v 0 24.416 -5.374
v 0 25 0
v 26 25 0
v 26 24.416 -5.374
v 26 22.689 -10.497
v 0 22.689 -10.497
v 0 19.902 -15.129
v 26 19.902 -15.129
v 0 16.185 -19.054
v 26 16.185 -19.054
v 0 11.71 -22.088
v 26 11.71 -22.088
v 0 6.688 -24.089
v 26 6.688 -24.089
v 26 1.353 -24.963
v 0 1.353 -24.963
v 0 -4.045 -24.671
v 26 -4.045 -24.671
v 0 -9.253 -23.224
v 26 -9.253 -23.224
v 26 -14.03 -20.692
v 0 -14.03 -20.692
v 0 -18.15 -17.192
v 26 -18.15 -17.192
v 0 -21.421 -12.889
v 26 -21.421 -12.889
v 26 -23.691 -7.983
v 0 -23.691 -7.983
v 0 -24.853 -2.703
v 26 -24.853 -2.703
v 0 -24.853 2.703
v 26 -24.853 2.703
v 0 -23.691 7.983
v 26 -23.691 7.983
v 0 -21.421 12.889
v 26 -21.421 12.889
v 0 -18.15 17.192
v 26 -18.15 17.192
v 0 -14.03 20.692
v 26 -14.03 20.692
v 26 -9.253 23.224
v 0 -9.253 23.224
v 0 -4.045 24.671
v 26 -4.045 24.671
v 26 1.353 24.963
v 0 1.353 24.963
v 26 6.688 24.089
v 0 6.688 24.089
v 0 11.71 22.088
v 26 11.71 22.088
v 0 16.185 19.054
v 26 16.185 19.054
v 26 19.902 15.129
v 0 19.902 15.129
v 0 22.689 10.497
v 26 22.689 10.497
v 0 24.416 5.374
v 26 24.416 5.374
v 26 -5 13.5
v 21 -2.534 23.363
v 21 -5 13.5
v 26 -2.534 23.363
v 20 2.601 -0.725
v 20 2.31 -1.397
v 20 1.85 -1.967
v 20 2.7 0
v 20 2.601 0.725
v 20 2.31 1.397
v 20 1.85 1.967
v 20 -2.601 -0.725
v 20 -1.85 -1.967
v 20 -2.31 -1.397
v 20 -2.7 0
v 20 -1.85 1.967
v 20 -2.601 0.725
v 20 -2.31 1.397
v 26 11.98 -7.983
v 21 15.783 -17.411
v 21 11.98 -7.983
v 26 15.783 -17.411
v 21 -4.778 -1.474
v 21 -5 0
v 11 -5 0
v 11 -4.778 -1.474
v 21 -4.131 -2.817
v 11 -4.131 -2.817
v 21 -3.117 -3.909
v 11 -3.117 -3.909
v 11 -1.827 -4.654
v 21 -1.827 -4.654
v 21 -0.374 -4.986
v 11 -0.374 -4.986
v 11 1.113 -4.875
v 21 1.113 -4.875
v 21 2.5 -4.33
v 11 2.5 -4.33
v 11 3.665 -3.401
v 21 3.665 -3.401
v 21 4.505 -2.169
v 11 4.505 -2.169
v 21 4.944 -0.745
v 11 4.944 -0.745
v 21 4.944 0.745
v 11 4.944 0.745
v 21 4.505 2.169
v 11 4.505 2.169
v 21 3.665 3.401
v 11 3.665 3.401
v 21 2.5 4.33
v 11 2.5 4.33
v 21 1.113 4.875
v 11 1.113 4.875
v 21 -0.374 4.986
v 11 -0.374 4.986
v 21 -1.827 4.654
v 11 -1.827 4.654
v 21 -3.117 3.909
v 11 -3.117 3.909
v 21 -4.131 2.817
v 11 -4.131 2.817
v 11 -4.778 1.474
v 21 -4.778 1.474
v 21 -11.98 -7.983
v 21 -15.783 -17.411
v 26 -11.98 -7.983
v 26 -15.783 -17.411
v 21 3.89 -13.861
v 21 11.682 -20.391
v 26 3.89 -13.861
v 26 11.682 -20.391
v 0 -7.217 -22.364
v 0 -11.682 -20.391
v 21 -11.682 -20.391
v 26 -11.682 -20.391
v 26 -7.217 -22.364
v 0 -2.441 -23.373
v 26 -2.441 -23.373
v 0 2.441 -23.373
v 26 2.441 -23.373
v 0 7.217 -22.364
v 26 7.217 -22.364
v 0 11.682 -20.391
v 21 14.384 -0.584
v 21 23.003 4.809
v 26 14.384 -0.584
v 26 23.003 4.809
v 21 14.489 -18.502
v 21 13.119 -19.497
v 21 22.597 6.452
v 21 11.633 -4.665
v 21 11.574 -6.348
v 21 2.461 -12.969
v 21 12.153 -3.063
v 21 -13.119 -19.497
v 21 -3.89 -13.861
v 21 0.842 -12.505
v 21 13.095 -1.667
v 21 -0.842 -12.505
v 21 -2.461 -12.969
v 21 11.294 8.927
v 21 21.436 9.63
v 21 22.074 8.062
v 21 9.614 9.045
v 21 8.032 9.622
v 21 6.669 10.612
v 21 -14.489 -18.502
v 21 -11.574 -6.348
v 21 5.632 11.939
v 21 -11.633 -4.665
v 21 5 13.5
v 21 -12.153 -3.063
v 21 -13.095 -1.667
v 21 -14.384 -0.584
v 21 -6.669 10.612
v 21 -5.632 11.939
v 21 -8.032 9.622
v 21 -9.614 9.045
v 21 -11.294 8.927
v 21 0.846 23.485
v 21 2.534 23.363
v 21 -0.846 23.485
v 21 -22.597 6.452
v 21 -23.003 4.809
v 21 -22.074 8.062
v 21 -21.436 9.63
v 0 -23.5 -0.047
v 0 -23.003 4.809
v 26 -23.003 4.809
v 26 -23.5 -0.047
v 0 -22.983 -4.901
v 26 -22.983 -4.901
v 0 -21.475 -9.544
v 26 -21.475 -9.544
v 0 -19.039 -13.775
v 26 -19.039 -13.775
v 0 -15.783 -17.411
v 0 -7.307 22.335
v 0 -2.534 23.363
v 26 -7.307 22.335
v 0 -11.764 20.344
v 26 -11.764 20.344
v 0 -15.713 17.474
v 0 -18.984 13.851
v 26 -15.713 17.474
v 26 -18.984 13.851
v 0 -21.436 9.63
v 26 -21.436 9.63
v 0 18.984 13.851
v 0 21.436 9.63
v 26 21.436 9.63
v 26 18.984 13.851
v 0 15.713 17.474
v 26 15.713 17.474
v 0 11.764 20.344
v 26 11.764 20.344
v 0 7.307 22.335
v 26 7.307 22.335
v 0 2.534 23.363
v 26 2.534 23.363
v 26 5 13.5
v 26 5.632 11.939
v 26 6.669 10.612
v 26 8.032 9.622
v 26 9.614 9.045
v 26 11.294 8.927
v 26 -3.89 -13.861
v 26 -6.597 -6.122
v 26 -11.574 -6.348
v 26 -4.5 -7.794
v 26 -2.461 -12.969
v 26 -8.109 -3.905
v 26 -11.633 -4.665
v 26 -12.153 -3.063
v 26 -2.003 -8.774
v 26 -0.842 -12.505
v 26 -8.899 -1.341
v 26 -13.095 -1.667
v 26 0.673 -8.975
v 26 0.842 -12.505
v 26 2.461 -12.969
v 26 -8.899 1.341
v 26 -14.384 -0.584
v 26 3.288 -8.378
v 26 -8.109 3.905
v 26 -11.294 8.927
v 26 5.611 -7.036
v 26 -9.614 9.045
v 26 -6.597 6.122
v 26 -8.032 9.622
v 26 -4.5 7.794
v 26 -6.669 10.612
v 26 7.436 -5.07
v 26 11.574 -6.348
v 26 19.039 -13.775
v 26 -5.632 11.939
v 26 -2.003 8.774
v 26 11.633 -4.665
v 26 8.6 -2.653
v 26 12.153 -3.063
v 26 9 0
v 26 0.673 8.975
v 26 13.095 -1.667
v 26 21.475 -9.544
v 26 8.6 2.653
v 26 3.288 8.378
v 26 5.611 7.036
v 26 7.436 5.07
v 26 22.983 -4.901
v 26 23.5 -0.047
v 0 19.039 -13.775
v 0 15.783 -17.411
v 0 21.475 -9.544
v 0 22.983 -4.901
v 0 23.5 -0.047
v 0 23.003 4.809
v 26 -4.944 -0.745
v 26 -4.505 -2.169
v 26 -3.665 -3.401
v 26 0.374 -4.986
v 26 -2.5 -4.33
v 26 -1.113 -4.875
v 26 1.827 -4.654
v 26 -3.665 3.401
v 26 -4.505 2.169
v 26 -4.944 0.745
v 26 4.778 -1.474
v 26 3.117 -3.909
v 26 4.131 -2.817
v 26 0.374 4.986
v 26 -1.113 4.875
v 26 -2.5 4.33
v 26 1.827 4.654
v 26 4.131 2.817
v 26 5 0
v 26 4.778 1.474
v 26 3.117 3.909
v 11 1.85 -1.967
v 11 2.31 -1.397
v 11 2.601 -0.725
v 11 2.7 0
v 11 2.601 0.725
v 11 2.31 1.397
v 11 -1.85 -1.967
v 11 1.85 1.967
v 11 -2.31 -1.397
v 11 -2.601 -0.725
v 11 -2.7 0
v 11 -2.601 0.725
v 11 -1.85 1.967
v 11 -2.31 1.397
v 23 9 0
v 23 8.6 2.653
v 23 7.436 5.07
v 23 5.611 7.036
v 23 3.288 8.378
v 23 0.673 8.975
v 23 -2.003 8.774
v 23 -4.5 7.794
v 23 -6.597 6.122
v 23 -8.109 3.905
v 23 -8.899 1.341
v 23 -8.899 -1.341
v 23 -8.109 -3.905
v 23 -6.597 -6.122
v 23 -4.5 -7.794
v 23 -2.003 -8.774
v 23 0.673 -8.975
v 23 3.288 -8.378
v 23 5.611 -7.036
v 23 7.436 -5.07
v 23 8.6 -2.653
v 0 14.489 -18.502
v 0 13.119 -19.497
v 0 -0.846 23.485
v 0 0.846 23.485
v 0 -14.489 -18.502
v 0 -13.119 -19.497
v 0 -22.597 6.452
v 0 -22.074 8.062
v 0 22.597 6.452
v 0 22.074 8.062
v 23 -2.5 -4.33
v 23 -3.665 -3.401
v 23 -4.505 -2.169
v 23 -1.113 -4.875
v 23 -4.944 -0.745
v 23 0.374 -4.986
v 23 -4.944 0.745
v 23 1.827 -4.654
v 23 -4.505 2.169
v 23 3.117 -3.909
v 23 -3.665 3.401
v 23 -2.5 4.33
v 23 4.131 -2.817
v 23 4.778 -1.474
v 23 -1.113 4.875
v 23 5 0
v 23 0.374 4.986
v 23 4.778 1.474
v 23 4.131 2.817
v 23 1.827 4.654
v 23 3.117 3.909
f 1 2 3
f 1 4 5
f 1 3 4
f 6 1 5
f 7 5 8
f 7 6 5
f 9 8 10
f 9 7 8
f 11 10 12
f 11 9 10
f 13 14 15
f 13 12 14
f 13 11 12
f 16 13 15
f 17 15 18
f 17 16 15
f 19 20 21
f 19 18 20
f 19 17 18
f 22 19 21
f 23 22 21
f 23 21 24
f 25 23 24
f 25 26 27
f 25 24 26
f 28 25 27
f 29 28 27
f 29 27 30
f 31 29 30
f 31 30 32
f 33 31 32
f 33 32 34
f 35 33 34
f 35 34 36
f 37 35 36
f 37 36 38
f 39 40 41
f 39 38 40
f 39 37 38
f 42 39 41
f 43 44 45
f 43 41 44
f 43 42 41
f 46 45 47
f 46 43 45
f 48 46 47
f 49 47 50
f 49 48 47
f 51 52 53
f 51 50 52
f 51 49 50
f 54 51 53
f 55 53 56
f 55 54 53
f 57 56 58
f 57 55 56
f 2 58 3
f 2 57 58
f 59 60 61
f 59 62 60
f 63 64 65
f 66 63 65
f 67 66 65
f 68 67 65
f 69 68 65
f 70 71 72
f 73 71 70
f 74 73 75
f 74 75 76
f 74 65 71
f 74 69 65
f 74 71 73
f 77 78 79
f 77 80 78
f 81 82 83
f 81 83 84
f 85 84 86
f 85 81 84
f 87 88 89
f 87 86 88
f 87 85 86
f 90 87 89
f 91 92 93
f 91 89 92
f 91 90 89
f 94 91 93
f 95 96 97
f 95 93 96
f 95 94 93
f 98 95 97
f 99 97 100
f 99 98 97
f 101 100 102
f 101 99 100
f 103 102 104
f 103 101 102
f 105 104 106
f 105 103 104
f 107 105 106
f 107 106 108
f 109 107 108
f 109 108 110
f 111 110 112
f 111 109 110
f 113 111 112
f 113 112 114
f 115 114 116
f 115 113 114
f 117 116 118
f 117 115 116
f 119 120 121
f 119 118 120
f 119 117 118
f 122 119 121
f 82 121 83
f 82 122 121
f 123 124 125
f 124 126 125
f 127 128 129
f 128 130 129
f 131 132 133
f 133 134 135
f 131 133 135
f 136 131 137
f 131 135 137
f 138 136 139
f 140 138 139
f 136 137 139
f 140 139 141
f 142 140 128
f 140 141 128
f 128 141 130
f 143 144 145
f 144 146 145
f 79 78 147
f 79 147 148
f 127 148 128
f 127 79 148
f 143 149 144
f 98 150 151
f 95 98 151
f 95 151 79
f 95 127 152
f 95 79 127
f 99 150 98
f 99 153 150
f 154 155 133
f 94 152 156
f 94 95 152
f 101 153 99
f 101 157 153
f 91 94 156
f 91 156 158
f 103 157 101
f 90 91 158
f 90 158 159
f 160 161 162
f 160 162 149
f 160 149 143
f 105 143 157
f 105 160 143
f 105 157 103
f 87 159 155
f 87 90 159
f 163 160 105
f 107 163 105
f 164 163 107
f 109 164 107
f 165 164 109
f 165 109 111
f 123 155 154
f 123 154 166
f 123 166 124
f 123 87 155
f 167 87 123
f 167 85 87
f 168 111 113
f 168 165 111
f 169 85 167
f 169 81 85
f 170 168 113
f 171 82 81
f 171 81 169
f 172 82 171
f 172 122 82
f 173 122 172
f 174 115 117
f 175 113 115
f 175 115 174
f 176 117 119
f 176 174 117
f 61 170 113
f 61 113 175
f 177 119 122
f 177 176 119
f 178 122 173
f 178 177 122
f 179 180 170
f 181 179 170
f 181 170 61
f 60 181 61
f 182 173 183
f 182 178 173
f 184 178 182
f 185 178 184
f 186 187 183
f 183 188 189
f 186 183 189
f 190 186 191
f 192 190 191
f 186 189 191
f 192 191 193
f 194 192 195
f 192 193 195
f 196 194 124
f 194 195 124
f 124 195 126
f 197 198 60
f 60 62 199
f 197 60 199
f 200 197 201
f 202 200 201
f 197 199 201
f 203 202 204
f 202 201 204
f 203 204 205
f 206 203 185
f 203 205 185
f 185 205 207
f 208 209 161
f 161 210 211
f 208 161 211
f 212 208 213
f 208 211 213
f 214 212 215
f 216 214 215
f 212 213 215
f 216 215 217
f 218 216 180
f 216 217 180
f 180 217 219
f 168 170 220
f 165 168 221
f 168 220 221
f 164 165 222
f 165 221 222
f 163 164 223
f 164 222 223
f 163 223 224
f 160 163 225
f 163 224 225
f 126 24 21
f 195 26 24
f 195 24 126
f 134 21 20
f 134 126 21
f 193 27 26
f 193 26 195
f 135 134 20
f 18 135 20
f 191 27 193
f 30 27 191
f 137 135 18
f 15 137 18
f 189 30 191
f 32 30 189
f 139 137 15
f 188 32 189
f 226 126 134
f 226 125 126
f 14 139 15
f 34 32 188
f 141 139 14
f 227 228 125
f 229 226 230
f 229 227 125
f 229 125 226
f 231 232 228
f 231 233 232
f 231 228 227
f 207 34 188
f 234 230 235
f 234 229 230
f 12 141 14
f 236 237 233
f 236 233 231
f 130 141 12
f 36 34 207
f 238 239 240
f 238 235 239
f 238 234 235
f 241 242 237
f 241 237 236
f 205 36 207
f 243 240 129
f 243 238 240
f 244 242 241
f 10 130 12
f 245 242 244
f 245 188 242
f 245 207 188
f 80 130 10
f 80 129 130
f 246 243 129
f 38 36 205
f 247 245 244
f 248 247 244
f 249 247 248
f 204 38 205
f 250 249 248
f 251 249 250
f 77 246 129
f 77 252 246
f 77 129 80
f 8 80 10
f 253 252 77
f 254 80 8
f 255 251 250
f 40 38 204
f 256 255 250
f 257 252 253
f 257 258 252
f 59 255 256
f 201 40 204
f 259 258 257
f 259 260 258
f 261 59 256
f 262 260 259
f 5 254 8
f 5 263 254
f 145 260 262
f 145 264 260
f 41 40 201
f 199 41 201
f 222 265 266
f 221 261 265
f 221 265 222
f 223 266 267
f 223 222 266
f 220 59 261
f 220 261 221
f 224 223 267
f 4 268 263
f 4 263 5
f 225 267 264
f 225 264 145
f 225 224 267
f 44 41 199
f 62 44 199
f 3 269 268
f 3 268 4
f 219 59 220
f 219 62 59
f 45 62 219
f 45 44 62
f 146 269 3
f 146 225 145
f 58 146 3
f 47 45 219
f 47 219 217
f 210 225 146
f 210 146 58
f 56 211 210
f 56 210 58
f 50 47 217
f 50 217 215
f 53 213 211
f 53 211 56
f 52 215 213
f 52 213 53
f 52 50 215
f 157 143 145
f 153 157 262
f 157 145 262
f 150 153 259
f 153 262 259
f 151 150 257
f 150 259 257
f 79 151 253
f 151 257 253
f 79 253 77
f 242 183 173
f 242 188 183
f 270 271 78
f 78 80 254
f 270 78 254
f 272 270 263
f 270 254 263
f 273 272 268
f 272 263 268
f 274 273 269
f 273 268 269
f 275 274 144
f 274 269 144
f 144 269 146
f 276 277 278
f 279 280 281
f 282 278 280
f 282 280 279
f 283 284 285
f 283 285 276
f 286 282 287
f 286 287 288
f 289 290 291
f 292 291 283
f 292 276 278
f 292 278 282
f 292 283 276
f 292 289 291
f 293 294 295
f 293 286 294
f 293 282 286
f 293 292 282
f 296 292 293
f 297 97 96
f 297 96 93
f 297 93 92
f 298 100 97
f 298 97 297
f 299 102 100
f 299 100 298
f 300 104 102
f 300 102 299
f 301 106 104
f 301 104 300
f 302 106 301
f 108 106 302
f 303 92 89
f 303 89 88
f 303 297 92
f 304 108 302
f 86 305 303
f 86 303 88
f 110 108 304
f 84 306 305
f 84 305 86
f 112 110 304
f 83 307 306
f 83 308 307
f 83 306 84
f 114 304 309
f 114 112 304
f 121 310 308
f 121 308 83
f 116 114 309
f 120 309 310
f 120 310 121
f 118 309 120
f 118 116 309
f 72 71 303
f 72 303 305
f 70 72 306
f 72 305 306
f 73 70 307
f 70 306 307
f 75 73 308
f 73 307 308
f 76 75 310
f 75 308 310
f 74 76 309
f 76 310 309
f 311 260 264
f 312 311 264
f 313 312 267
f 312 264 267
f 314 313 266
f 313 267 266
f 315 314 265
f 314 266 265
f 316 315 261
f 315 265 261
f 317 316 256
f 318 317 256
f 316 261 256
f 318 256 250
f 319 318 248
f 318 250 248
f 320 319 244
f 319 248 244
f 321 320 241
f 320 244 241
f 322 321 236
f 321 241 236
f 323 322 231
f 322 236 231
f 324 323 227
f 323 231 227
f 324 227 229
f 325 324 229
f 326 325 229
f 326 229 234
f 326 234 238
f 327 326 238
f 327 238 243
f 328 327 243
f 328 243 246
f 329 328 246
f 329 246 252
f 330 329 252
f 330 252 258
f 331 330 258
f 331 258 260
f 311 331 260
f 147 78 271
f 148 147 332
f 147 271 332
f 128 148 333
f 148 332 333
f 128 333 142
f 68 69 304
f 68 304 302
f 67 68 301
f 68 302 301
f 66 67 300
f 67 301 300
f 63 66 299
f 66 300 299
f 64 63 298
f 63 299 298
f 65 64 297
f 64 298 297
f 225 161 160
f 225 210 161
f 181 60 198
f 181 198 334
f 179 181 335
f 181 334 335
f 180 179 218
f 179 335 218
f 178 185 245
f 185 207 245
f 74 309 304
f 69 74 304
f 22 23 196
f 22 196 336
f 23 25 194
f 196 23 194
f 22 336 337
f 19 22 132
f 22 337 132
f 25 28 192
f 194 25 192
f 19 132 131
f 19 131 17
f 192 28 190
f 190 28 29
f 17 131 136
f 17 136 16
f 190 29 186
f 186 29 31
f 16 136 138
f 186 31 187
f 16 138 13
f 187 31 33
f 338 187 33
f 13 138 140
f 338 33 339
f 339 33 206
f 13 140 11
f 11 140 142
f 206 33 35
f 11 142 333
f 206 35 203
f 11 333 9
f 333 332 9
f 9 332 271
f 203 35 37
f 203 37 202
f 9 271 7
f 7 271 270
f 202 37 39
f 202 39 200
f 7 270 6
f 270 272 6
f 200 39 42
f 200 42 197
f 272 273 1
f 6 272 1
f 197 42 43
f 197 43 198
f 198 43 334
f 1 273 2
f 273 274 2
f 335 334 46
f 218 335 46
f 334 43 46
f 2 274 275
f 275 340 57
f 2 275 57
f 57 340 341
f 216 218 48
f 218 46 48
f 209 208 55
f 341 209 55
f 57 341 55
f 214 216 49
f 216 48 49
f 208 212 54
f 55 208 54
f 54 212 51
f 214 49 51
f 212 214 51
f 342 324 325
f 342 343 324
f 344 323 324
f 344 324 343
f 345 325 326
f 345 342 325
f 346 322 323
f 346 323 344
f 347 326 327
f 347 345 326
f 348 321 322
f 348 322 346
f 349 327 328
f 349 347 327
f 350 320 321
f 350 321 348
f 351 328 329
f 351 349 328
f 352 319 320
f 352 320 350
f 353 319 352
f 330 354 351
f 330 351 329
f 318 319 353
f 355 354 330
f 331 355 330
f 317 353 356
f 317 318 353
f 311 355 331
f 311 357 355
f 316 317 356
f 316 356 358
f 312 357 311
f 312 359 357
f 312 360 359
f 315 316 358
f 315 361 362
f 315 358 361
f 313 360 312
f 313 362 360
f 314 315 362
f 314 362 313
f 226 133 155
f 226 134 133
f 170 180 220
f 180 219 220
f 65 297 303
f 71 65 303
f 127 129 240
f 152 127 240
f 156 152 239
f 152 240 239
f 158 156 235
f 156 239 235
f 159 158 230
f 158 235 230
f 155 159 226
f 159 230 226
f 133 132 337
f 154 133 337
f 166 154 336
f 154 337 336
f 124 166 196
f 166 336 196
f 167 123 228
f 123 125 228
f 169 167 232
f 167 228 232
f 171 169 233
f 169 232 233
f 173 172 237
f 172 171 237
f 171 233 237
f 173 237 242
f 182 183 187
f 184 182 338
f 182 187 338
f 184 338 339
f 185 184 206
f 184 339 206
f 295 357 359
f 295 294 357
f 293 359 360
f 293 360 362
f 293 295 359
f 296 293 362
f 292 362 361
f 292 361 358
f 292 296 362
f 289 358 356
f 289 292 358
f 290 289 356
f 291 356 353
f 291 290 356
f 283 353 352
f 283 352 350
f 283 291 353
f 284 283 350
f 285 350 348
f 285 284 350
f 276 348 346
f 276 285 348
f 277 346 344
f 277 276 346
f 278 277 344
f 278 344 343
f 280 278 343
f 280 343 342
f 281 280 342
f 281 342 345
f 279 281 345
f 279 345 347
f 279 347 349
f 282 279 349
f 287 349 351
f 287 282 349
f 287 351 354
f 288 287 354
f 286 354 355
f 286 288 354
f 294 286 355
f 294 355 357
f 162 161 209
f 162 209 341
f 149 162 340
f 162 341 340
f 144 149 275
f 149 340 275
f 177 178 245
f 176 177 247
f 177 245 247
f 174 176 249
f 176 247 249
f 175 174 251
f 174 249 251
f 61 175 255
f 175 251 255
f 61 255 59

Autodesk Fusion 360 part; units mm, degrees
sketch "Boceto1" plane through (0, 0, 0) normal (1, 0, 0) x (0, 1, 0)
  circle A0 centre (0, 0) radius 25
  dimension "d1" = 50
extrude "Wheel width" add sketch "Boceto1" along normal blind 26
sketch "Boceto2" plane through (26, 0, 0) normal (1, 0, 0) x (0, 1, 0)
  circle A0 centre (0, 0) radius 25
  circle A1 centre (0, 0) radius 5
  circle A2 centre (0, 0) radius 9
  dimension "d4" = 10
  dimension "d5" = 18
extrude "Wheel profile 1 (1)" cut sketch "Boceto2" against normal blind 3 contours A2
sketch "Boceto3" plane through (26, 0, 0) normal (1, 0, 0) x (0, 1, 0)
  circle A0 centre (0, 0) radius 25
  circle A1 centre (0, 0) radius 9
  circle A2 centre (0, 0) radius 23.5
  line L0 (0, 23.5) -> (0, 13.5) construction
  line L1 (0, 13.5) -> (-5, 13.5)
  line L2 (0, 13.5) -> (5, 13.5)
  line L3 (0, 23.5) -> (-2.5, 23.5)
  line L4 (-2.5, 23.5) -> (-5, 13.5)
  line L5 (2.5, 23.5) -> (5, 13.5)
  line L6 (0, 23.5) -> (2.5, 23.5)
  line L7 (-12.8393, 4.1717) -> (-11.2942, 8.927)
  line L8 (-12.8393, 4.1717) -> (-14.3843, -0.5836)
  line L9 (-23.1224, 4.8843) -> (-14.3843, -0.5836)
  line L10 (-22.3498, 7.2619) -> (-23.1224, 4.8843)
  line L11 (-22.3498, 7.2619) -> (-21.5773, 9.6395)
  line L12 (-21.5773, 9.6395) -> (-11.2942, 8.927)
  line L13 (-7.9351, -10.9217) -> (-11.9802, -7.9828)
  line L14 (-7.9351, -10.9217) -> (-3.89, -13.8607)
  line L15 (-11.7904, -20.4814) -> (-3.89, -13.8607)
  line L16 (-13.813, -19.0119) -> (-11.7904, -20.4814)
  line L17 (-13.813, -19.0119) -> (-15.8355, -17.5424)
  line L18 (-15.8355, -17.5424) -> (-11.9802, -7.9828)
  line L19 (7.9351, -10.9217) -> (3.89, -13.8607)
  line L20 (7.9351, -10.9217) -> (11.9802, -7.9828)
  line L21 (15.8355, -17.5424) -> (11.9802, -7.9828)
  line L22 (13.813, -19.0119) -> (15.8355, -17.5424)
  line L23 (13.813, -19.0119) -> (11.7904, -20.4814)
  line L24 (11.7904, -20.4814) -> (3.89, -13.8607)
  line L25 (12.8393, 4.1717) -> (14.3843, -0.5836)
  line L26 (12.8393, 4.1717) -> (11.2942, 8.927)
  line L27 (21.5773, 9.6395) -> (11.2942, 8.927)
  line L28 (22.3498, 7.2619) -> (21.5773, 9.6395)
  line L29 (22.3498, 7.2619) -> (23.1224, 4.8843)
  line L30 (23.1224, 4.8843) -> (14.3843, -0.5836)
  arc A3 (-11.2942, 8.927) -> (-5, 13.5) centre (-10.8755, 14.9689) ccw
  arc A4 (-11.9802, -7.9828) -> (-14.3843, -0.5836) centre (-17.597, -5.7176) ccw
  arc A5 (3.89, -13.8607) -> (-3.89, -13.8607) centre (0, -18.5026) ccw
  arc A6 (14.3843, -0.5836) -> (11.9802, -7.9828) centre (17.597, -5.7176) ccw
  arc A7 (5, 13.5) -> (11.2942, 8.927) centre (10.8755, 14.9689) ccw
  dimension "d8" = 47
  dimension "d9" = 10
  dimension "d10" = 5
  dimension "d12" = 2.5
  dimension "d14" = 360
extrude "Wheel profile 2 (1)" cut sketch "Boceto3" against normal through all contours A2 L21 L30 A6 | A2 L5 L27 A7 | A2 L15 L24 A5 | A2 L4 L12 A3 | A2 L9 L18 A4
sketch "Boceto4" plane through (0, 0, 0) normal (-1, 0, 0) x (0, -1, 0)
  line L0 (-11.9802, -7.9828) -> (-15.7827, -17.4114)
  arc A0 (-23.0026, 4.8093) -> (-15.7827, -17.4114) centre (0, 0) ccw
  line L1 (-23.0026, 4.8093) -> (-14.3843, -0.5836)
  arc A1 (-11.9802, -7.9828) -> (-14.3843, -0.5836) centre (-17.597, -5.7176) ccw
  line L2 (-11.2942, 8.927) -> (-21.4364, 9.6298)
  arc A2 (-2.5343, 23.363) -> (-21.4364, 9.6298) centre (0, 0) ccw
  line L3 (-2.5343, 23.363) -> (-5, 13.5)
  arc A3 (-11.2942, 8.927) -> (-5, 13.5) centre (-10.8755, 14.9689) ccw
  line L4 (3.89, -13.8607) -> (11.6821, -20.3906)
  arc A4 (-11.6821, -20.3906) -> (11.6821, -20.3906) centre (0, 0) ccw
  line L5 (-11.6821, -20.3906) -> (-3.89, -13.8607)
  arc A5 (3.89, -13.8607) -> (-3.89, -13.8607) centre (0, -18.5026) ccw
  line L6 (5, 13.5) -> (2.5343, 23.363)
  arc A6 (21.4364, 9.6298) -> (2.5343, 23.363) centre (0, 0) ccw
  line L7 (21.4364, 9.6298) -> (11.2942, 8.927)
  arc A7 (5, 13.5) -> (11.2942, 8.927) centre (10.8755, 14.9689) ccw
  line L8 (14.3843, -0.5836) -> (23.0026, 4.8093)
  arc A8 (15.7827, -17.4114) -> (23.0026, 4.8093) centre (0, 0) ccw
  line L9 (15.7827, -17.4114) -> (11.9802, -7.9828)
  arc A9 (14.3843, -0.5836) -> (11.9802, -7.9828) centre (17.597, -5.7176) ccw
  circle A10 centre (0, 0) radius 25
  circle A11 centre (0, 0) radius 23.5
extrude "Wheel hole (1)" cut sketch "Boceto4" against normal blind 21 contours L0 L1 A1 L2 L3 A3 L4 L5 A5 L6 L7 A7 L8 L9 A9 A11
sketch "Boceto5" plane through (21, 0, 0) normal (-1, 0, 0) x (0, -1, 0)
  line L0 (3.89, -13.8607) -> (11.6821, -20.3906)
  arc A0 (11.6821, -20.3906) -> (15.7827, -17.4114) centre (0, 0) ccw
  line L1 (15.7827, -17.4114) -> (11.9802, -7.9828)
  arc A1 (14.3843, -0.5836) -> (11.9802, -7.9828) centre (17.597, -5.7176) ccw
  line L2 (14.3843, -0.5836) -> (23.0026, 4.8093)
  arc A2 (23.0026, 4.8093) -> (21.4364, 9.6298) centre (0, 0) ccw
  line L3 (21.4364, 9.6298) -> (11.2942, 8.927)
  arc A3 (5, 13.5) -> (11.2942, 8.927) centre (10.8755, 14.9689) ccw
  line L4 (5, 13.5) -> (2.5343, 23.363)
  arc A4 (2.5343, 23.363) -> (-2.5343, 23.363) centre (0, 0) ccw
  line L5 (-2.5343, 23.363) -> (-5, 13.5)
  arc A5 (-11.2942, 8.927) -> (-5, 13.5) centre (-10.8755, 14.9689) ccw
  line L6 (-11.2942, 8.927) -> (-21.4364, 9.6298)
  arc A6 (-21.4364, 9.6298) -> (-23.0026, 4.8093) centre (0, 0) ccw
  line L7 (-23.0026, 4.8093) -> (-14.3843, -0.5836)
  arc A7 (-11.9802, -7.9828) -> (-14.3843, -0.5836) centre (-17.597, -5.7176) ccw
  line L8 (-11.9802, -7.9828) -> (-15.7827, -17.4114)
  arc A8 (-15.7827, -17.4114) -> (-11.6821, -20.3906) centre (0, 0) ccw
  line L9 (-11.6821, -20.3906) -> (-3.89, -13.8607)
  arc A9 (3.89, -13.8607) -> (-3.89, -13.8607) centre (0, -18.5026) ccw
  circle A10 centre (0, 0) radius 5
  dimension "d18" = 10
extrude "Connector base (1)" add sketch "Boceto5" along normal blind 10 contours A10
sketch "Boceto6" plane through (11, 0, 0) normal (-1, 0, 0) x (0, -1, 0)
  circle A0 centre (0, 0) radius 5
  line L0 (1.85, 1.9666) -> (-1.85, 1.9666)
  line L1 (-1.85, -1.9666) -> (1.85, -1.9666)
  arc A1 (-1.85, 1.9666) -> (-1.85, -1.9666) centre (0, 0) ccw
  arc A2 (1.85, -1.9666) -> (1.85, 1.9666) centre (0, 0) ccw
  dimension "d21" = 5.4
  dimension "d22" = 3.7
extrude "Connector hole (1)" cut sketch "Boceto6" against normal blind 9 contours L0 L1 A1 A2
